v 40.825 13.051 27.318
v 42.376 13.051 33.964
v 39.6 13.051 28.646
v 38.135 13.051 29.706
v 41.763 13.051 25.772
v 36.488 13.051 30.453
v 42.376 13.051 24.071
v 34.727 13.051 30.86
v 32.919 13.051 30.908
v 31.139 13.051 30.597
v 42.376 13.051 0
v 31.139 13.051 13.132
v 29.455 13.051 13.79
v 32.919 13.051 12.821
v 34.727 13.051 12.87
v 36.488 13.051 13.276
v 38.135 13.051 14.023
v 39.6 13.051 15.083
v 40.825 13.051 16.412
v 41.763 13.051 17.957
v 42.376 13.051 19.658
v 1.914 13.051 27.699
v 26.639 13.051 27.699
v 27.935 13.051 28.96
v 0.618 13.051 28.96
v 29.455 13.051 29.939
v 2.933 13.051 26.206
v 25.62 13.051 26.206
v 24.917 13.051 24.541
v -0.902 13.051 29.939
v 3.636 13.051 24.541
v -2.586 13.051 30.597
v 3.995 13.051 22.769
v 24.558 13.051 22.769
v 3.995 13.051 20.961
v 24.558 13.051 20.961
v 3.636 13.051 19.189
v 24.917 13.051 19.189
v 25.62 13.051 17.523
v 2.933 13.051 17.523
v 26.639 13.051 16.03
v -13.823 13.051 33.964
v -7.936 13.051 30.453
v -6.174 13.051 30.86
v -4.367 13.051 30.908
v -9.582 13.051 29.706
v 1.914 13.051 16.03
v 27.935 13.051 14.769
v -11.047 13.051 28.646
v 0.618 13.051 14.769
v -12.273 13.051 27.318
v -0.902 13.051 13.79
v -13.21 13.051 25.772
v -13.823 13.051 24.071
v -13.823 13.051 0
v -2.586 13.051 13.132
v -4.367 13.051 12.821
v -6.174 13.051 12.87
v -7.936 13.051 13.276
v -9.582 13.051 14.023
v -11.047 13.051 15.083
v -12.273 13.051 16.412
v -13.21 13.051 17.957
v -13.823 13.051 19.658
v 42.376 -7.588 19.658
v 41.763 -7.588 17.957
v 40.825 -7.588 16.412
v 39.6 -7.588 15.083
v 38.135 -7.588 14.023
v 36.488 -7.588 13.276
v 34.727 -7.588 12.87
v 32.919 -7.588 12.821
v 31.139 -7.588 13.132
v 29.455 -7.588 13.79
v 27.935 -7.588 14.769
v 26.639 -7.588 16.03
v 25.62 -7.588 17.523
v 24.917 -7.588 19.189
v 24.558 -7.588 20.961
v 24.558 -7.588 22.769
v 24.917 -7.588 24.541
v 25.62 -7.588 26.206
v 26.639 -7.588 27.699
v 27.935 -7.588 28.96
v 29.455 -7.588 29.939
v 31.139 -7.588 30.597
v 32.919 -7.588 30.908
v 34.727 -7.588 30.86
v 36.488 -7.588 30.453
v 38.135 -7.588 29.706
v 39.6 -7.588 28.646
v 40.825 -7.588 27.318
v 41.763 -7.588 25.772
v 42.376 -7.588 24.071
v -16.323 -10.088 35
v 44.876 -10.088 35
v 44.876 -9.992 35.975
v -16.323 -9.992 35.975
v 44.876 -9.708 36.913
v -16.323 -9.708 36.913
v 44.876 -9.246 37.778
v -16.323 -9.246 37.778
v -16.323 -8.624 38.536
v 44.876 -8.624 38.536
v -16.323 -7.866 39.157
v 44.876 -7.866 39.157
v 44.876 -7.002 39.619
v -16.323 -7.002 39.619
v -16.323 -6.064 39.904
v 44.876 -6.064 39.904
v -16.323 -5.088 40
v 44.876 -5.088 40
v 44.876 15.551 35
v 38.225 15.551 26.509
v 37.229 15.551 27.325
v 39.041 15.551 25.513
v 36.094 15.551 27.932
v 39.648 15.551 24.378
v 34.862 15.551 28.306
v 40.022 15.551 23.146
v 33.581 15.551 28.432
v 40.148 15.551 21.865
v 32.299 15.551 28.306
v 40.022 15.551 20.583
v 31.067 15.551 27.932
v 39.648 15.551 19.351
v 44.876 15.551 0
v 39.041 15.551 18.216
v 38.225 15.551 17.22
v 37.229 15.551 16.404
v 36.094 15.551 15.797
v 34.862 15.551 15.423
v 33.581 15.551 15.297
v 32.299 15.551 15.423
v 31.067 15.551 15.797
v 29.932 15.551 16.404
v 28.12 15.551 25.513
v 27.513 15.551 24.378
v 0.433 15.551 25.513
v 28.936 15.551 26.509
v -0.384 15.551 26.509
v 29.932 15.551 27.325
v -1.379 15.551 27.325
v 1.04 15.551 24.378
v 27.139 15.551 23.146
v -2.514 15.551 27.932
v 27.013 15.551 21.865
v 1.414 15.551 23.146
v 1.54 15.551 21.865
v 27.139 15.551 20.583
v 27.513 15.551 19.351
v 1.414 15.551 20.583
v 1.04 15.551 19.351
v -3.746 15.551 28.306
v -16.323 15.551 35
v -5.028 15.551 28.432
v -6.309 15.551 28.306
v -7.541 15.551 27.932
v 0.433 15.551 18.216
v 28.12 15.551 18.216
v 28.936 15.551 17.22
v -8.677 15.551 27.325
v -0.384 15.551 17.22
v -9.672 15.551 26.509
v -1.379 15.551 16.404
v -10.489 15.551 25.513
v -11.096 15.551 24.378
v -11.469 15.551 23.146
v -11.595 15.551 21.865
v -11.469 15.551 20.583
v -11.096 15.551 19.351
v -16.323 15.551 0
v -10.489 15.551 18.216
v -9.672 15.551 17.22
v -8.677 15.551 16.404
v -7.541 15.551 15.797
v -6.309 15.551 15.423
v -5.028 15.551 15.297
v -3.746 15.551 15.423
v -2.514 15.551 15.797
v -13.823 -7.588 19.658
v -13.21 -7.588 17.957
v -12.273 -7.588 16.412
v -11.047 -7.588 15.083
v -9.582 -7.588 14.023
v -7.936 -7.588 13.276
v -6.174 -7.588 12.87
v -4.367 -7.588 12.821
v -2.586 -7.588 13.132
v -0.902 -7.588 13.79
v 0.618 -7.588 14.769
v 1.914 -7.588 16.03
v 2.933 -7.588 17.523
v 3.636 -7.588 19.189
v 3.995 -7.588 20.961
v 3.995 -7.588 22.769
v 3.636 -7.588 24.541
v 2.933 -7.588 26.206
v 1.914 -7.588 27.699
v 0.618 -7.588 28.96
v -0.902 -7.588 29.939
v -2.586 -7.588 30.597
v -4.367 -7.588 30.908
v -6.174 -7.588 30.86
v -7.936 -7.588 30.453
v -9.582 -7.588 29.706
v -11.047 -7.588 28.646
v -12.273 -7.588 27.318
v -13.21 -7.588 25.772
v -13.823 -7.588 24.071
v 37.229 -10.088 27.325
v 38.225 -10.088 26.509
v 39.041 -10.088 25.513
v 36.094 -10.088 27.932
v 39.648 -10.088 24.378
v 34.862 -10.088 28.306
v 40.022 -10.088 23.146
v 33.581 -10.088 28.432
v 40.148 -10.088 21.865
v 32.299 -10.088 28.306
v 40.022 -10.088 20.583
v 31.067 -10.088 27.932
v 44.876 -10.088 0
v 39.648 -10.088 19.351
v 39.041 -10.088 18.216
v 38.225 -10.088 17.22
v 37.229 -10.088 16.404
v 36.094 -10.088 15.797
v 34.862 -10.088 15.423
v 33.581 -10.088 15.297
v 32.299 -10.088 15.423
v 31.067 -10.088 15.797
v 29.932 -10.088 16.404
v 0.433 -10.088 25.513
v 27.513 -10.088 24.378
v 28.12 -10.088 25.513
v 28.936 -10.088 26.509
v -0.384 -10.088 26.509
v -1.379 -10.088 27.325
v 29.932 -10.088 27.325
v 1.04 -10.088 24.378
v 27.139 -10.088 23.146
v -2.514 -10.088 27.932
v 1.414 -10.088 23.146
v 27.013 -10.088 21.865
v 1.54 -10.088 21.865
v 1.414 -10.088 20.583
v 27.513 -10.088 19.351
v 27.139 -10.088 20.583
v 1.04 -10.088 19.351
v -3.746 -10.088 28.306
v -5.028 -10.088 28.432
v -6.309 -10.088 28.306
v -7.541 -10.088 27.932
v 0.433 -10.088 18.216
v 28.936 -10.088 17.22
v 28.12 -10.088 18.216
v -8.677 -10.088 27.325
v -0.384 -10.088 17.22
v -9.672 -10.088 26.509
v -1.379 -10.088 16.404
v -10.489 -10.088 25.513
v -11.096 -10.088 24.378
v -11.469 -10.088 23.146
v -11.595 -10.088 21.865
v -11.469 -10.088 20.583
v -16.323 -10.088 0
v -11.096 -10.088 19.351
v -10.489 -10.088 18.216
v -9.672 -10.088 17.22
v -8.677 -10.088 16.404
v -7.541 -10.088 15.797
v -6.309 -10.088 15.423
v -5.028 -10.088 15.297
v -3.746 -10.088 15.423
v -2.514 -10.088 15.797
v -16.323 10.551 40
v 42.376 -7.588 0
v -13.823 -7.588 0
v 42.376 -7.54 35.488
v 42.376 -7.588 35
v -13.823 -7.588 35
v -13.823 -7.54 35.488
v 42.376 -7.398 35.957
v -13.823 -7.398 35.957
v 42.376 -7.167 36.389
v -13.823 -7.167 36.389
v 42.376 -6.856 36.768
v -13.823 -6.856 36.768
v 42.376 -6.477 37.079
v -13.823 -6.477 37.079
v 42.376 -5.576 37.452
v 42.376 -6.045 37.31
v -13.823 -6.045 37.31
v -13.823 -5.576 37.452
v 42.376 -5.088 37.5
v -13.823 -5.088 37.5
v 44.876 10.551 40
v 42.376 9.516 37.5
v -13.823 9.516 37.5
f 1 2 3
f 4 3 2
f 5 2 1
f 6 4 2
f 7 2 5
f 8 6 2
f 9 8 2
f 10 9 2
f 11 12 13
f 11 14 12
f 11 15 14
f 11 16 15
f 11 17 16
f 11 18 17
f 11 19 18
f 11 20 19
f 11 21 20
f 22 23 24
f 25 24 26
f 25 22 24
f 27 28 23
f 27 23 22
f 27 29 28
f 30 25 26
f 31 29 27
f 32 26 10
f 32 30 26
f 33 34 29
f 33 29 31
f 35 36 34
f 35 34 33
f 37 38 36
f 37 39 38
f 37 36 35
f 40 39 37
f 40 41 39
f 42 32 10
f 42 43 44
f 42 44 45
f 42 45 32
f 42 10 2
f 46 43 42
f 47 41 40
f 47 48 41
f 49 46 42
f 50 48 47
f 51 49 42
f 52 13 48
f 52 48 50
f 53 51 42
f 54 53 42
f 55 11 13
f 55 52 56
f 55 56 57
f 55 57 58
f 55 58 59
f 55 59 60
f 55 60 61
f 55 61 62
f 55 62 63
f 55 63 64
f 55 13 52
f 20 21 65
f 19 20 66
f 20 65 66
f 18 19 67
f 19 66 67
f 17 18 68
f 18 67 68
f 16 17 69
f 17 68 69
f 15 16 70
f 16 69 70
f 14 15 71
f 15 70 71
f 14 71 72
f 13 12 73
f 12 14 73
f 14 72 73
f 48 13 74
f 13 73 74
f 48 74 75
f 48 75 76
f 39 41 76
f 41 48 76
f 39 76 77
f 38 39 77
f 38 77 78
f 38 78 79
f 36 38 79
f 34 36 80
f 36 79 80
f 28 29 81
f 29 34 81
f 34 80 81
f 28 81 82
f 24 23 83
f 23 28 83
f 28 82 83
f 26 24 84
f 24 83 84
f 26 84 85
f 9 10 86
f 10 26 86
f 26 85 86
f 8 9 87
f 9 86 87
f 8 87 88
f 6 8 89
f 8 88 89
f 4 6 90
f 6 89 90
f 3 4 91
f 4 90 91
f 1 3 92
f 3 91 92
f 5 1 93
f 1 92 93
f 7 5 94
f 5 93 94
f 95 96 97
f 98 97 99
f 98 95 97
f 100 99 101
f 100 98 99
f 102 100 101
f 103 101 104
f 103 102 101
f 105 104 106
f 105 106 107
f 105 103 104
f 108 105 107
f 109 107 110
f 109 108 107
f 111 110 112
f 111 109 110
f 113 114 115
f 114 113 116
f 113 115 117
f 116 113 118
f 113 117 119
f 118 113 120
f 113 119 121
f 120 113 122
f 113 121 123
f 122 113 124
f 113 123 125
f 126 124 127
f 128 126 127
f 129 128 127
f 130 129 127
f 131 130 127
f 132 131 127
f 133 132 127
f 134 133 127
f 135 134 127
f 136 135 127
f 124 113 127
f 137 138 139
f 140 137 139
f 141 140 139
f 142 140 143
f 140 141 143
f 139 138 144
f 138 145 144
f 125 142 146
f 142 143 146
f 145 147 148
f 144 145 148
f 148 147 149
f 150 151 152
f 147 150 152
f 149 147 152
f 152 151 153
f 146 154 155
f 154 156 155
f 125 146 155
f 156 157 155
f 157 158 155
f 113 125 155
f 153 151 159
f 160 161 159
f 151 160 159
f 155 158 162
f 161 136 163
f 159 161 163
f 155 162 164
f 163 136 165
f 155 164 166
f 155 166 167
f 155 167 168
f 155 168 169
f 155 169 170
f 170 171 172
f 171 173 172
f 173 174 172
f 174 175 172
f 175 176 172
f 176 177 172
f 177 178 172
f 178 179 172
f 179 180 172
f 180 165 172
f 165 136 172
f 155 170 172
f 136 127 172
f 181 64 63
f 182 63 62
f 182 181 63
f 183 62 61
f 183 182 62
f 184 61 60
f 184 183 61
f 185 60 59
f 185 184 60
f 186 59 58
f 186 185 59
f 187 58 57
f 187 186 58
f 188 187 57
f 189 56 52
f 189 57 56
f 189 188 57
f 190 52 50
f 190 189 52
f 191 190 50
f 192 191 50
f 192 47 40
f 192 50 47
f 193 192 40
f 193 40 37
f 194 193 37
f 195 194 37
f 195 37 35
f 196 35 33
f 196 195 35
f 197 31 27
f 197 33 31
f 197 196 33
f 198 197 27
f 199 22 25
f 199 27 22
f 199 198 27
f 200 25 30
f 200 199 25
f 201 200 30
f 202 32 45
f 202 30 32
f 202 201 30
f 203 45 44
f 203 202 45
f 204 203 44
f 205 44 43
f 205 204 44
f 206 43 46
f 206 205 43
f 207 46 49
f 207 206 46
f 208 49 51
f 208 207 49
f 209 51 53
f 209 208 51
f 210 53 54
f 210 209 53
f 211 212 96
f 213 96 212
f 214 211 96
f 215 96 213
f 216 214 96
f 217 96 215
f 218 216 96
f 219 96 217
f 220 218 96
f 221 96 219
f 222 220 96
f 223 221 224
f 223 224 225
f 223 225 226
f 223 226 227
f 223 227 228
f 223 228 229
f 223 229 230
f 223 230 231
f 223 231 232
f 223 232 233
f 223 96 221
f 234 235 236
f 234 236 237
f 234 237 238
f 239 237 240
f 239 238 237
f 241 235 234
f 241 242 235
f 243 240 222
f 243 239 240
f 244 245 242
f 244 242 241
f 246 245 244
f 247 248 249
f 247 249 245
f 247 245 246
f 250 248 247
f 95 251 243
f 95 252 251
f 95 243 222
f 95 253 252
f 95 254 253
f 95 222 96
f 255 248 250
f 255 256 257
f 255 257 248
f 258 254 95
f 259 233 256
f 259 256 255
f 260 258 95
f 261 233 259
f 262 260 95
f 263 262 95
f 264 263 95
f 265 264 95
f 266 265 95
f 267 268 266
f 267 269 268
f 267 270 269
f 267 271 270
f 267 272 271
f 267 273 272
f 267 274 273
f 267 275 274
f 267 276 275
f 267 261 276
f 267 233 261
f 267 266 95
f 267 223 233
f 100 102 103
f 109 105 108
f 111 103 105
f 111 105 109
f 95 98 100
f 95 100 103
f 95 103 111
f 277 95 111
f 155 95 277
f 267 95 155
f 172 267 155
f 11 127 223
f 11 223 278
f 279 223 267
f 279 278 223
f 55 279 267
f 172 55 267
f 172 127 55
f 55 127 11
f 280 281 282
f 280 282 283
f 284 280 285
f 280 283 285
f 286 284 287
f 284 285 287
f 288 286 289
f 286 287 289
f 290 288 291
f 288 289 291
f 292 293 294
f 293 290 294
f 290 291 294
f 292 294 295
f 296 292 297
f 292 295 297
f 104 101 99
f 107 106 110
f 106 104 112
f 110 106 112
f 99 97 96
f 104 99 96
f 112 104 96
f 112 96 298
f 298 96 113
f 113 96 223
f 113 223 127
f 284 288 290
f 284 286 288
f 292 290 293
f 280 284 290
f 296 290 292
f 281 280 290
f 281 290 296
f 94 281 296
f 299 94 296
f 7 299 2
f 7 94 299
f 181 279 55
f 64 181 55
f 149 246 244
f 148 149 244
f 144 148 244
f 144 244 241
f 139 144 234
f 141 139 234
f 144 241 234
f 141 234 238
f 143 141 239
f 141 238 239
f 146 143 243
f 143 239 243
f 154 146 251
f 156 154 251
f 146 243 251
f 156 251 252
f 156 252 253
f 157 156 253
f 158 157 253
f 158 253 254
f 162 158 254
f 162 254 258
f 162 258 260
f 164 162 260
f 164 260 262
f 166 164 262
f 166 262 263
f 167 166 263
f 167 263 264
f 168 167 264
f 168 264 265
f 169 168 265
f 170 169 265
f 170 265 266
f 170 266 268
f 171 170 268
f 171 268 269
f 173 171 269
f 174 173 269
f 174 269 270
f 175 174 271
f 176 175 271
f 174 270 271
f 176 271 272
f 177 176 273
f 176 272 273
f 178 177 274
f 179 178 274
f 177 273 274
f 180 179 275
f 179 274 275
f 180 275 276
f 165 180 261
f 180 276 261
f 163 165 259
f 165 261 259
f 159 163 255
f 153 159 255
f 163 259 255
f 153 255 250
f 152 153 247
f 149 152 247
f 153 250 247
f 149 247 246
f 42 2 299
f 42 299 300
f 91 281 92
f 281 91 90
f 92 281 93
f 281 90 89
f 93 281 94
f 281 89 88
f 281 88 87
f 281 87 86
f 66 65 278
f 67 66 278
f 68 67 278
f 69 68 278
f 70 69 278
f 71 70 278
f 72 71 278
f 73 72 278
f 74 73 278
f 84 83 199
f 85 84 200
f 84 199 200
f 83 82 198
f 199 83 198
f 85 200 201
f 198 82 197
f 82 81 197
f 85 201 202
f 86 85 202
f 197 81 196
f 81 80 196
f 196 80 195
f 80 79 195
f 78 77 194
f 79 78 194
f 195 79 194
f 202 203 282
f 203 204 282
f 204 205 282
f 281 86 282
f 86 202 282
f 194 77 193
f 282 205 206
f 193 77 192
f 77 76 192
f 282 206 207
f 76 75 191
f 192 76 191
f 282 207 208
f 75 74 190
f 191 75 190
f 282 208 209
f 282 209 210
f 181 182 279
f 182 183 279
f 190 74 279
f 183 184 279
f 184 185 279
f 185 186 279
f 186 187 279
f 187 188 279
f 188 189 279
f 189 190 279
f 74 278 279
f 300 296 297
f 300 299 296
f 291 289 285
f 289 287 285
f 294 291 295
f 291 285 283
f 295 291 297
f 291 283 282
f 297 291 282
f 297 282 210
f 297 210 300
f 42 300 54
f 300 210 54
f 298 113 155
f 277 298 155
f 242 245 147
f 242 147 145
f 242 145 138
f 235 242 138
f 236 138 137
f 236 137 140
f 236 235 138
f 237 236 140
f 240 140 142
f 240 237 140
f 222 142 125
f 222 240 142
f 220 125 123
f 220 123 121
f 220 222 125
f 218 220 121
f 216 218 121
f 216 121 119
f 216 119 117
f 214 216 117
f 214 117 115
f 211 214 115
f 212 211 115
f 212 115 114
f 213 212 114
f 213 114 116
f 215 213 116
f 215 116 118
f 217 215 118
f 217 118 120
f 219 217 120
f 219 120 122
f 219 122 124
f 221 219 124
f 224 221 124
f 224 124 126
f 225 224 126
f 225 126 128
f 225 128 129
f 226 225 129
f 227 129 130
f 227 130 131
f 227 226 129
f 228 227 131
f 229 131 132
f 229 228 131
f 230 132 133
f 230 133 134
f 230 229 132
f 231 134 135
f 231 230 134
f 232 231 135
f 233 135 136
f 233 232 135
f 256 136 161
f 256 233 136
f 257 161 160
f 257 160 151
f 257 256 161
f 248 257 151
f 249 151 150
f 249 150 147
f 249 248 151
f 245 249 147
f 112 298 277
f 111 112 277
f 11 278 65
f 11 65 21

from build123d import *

# Parameters (mm, degrees)
F0_W     = 30.5993435904
F0_H     = 25.6396476179
F1_DEPTH = 40
F2_R     = 6.5677441637
F3_DEPTH = 25.6406476179
F4_R     = 5
F5_SIZE  = 5
F6_T     = -2.5


with BuildPart() as f1:
    # F0 (on Top) → F1 (new body)
    with BuildSketch(Plane.XY):
        with Locations((-1.0232594796, 2.7313483879)):
            Rectangle(F0_W, F0_H)
    extrude(amount=F1_DEPTH)

    # F2 (on face) → F3 (cut, through all)
    with BuildSketch(Plane.XZ.offset(10.0884754211)):
        with Locations((-5.0276978873, 21.8645650893)):
            Circle(F2_R)
    extrude(amount=-F3_DEPTH, mode=Mode.SUBTRACT)

    # F4
    f4_edges = [f1.edges().sort_by_distance(p)[0] for p in [
        (-1.023259, -10.088475, 40),
    ]]
    fillet(f4_edges, radius=F4_R)

    # F5
    f5_edges = [f1.edges().sort_by_distance(p)[0] for p in [
        (-1.023259, 15.551172, 40),
    ]]
    chamfer(f5_edges, length=F5_SIZE)

    # F6
    f6_openings = [f1.faces().sort_by_distance(p)[0] for p in [
        (-1.023259, 2.731348, 0),
        (14.276412, 2.655308, 19.672056),
    ]]
    offset(amount=F6_T, openings=f6_openings)

    # F7: F1 across face


with BuildPart() as f1_1:
    add(f1.part)
    add(f1.part.mirror(Plane(origin=(14.2764123157, 2.5963156979, 23.1564866068), x_dir=(0, 1, 0), z_dir=(1, 0, 0))))


solid = f1_1.part
